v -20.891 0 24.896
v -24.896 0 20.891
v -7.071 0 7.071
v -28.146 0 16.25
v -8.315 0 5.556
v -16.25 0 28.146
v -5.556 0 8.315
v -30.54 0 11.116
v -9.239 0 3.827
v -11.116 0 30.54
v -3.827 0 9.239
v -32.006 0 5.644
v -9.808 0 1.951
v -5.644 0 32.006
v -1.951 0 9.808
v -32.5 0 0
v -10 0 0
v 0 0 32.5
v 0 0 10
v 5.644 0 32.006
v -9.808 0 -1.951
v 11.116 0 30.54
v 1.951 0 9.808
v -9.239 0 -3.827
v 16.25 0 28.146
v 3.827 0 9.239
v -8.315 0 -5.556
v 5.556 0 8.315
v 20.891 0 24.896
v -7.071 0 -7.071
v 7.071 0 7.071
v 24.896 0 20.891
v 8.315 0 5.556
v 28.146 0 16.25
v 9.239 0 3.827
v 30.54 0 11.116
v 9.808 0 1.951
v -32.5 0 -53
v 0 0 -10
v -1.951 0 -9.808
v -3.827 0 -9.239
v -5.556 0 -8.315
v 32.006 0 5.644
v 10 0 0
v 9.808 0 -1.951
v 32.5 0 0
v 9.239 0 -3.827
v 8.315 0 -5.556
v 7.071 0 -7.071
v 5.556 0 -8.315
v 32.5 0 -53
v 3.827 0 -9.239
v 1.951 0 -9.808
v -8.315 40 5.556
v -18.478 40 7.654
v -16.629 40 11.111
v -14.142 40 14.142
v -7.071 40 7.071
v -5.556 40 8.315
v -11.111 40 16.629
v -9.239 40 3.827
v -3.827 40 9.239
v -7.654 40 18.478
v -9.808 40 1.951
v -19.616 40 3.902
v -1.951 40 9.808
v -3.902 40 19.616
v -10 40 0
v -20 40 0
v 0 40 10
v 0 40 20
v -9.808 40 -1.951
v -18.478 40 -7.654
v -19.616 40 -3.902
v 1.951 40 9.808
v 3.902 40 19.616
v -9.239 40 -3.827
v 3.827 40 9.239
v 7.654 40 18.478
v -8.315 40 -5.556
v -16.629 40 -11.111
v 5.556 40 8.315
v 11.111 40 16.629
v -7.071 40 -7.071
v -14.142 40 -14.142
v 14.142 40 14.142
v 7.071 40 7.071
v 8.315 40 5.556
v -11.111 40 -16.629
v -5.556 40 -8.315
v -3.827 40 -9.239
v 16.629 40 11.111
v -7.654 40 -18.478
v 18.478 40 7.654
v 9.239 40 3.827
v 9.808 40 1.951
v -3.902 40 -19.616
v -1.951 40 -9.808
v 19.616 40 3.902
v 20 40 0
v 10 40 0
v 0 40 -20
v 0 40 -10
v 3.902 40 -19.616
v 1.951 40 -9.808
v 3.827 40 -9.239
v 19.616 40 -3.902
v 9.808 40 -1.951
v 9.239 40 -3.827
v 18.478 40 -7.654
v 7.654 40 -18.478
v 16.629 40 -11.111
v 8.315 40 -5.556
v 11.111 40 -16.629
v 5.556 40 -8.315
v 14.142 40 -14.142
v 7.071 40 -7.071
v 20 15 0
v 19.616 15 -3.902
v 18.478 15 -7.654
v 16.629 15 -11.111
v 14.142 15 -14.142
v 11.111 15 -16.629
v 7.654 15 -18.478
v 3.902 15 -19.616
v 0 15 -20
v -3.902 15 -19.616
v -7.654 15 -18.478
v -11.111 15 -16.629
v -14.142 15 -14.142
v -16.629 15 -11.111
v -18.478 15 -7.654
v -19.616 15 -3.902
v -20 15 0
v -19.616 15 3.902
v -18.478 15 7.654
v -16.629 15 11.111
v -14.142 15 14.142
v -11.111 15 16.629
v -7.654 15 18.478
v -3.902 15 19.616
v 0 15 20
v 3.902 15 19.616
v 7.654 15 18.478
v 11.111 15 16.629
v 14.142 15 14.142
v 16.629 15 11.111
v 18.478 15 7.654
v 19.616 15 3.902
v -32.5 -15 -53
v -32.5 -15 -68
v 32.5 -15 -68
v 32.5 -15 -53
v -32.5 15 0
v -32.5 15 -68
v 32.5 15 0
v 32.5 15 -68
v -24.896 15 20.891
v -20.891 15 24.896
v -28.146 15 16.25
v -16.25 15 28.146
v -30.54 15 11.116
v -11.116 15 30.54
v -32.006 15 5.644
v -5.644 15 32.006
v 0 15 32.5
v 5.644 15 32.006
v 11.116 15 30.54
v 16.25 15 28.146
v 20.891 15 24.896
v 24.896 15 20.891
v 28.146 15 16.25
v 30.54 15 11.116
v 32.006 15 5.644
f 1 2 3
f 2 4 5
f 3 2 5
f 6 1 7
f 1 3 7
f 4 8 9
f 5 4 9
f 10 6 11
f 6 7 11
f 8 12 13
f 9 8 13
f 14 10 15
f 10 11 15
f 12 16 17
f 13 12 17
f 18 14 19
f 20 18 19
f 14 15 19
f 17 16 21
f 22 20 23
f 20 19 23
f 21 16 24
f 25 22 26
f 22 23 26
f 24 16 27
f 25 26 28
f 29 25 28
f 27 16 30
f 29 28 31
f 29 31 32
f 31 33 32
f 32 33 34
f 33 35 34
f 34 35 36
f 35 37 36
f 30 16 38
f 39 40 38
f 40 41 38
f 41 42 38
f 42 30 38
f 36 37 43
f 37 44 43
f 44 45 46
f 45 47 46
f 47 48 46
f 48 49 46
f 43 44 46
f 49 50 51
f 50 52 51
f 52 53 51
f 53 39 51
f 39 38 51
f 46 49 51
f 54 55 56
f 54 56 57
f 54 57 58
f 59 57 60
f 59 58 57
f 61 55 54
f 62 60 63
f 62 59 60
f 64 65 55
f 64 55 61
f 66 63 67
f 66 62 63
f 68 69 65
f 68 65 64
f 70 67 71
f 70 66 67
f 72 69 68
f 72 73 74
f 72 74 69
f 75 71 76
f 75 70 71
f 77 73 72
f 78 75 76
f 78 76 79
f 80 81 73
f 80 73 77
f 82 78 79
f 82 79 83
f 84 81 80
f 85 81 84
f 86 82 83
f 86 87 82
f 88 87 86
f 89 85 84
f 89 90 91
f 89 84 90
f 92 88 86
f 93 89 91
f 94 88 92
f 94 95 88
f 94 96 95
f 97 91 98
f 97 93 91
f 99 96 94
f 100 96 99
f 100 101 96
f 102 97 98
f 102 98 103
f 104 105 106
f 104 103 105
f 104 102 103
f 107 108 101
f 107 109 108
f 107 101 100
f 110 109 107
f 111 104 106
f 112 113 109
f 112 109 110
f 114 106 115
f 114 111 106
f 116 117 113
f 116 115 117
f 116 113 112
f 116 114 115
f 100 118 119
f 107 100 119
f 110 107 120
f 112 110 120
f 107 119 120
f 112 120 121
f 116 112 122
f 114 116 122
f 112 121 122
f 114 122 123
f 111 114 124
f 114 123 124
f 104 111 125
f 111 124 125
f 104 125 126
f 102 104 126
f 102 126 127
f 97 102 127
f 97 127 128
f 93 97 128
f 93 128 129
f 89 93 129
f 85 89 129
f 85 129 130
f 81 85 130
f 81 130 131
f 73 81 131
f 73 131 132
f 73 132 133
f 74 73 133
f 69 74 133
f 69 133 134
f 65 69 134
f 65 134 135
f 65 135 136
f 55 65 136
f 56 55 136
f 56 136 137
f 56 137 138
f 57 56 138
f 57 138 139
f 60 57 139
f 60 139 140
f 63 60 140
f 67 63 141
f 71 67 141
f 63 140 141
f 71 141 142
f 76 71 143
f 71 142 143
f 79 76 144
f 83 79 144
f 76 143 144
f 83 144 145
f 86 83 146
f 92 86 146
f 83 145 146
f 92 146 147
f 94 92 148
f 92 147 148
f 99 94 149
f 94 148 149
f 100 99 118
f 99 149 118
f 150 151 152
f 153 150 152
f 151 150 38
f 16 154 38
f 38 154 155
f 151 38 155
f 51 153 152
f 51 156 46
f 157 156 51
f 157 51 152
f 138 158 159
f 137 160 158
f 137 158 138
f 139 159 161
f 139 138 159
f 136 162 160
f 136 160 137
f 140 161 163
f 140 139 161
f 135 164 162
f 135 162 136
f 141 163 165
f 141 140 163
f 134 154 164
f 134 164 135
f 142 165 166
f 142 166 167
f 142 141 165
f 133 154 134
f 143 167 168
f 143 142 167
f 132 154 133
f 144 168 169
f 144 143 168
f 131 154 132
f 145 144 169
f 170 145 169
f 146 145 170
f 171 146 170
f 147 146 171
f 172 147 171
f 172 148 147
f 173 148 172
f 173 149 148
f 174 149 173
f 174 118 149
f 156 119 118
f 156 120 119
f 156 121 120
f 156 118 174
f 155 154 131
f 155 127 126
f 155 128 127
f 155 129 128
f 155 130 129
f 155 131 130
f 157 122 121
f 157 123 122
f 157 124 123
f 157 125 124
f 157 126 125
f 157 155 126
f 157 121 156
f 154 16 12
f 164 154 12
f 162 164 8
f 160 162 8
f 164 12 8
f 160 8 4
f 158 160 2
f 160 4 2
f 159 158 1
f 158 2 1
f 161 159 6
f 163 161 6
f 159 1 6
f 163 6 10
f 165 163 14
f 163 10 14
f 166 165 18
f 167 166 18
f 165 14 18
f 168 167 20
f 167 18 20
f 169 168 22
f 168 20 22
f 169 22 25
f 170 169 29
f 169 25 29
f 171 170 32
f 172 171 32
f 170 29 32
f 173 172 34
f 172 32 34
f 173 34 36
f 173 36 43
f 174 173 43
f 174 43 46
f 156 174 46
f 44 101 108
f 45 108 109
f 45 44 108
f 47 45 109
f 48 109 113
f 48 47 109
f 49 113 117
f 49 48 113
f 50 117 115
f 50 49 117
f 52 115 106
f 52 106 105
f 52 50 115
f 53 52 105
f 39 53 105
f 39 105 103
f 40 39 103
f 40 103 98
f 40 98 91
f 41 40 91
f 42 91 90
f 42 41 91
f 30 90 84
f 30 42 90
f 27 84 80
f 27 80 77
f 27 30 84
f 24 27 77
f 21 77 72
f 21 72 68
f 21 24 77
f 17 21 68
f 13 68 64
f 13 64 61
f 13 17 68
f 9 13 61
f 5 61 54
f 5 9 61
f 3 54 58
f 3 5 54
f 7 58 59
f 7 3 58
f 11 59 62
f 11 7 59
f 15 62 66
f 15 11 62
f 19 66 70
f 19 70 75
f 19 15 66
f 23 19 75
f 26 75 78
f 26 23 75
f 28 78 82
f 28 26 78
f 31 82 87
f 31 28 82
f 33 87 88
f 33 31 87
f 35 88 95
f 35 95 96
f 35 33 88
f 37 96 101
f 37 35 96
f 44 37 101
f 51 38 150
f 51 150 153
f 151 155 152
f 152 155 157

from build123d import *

# Parameters (mm, degrees)
SKETCH3_R                = 20
SKETCH3_R_2              = 10
BOSS_EXTRUDE4_DEPTH      = 40
SKETCH3_7_R              = 20
BOSS_EXTRUDE5_DEPTH      = 15
BOSS_EXTRUDE6_DEPTH      = 15
BOSS_EXTRUDE6_DEPTH_BACK = 15
SKETCH3_8_W              = 65
SKETCH3_8_H              = 15


with BuildPart() as part:
    # Sketch3 → Boss-Extrude4 (new body)
    with BuildSketch(Plane(origin=(0, 0, 0), x_dir=(1, 0, 0), z_dir=(0, 1, 0))):
        Circle(SKETCH3_R)
        Circle(SKETCH3_R_2, mode=Mode.SUBTRACT)
    extrude(amount=BOSS_EXTRUDE4_DEPTH)

    # Sketch3<7> → Boss-Extrude5 (add)
    with BuildSketch(Plane(origin=(0, 0, 0), x_dir=(1, 0, 0), z_dir=(0, 1, 0))):
        with BuildLine():
            Line((32.5, 53), (-32.5, 53))
            Line((-32.5, 53), (-32.5, 0))
            ThreePointArc((-32.5, 0), (0, -32.5), (32.5, 0))
            Line((32.5, 0), (32.5, 53))
        make_face()
        Circle(SKETCH3_7_R, mode=Mode.SUBTRACT)
    extrude(amount=BOSS_EXTRUDE5_DEPTH)

    # Sketch3<8> → Boss-Extrude6 (add, two sides: drawn at the far end of the back side and taken through both)
    with BuildSketch(Plane(origin=(0, 0, 0), x_dir=(1, 0, 0), z_dir=(0, 1, 0)).offset(-BOSS_EXTRUDE6_DEPTH_BACK)):
        with Locations((0, 60.5)):
            Rectangle(SKETCH3_8_W, SKETCH3_8_H)
    extrude(amount=BOSS_EXTRUDE6_DEPTH + BOSS_EXTRUDE6_DEPTH_BACK)


solid = part.part
